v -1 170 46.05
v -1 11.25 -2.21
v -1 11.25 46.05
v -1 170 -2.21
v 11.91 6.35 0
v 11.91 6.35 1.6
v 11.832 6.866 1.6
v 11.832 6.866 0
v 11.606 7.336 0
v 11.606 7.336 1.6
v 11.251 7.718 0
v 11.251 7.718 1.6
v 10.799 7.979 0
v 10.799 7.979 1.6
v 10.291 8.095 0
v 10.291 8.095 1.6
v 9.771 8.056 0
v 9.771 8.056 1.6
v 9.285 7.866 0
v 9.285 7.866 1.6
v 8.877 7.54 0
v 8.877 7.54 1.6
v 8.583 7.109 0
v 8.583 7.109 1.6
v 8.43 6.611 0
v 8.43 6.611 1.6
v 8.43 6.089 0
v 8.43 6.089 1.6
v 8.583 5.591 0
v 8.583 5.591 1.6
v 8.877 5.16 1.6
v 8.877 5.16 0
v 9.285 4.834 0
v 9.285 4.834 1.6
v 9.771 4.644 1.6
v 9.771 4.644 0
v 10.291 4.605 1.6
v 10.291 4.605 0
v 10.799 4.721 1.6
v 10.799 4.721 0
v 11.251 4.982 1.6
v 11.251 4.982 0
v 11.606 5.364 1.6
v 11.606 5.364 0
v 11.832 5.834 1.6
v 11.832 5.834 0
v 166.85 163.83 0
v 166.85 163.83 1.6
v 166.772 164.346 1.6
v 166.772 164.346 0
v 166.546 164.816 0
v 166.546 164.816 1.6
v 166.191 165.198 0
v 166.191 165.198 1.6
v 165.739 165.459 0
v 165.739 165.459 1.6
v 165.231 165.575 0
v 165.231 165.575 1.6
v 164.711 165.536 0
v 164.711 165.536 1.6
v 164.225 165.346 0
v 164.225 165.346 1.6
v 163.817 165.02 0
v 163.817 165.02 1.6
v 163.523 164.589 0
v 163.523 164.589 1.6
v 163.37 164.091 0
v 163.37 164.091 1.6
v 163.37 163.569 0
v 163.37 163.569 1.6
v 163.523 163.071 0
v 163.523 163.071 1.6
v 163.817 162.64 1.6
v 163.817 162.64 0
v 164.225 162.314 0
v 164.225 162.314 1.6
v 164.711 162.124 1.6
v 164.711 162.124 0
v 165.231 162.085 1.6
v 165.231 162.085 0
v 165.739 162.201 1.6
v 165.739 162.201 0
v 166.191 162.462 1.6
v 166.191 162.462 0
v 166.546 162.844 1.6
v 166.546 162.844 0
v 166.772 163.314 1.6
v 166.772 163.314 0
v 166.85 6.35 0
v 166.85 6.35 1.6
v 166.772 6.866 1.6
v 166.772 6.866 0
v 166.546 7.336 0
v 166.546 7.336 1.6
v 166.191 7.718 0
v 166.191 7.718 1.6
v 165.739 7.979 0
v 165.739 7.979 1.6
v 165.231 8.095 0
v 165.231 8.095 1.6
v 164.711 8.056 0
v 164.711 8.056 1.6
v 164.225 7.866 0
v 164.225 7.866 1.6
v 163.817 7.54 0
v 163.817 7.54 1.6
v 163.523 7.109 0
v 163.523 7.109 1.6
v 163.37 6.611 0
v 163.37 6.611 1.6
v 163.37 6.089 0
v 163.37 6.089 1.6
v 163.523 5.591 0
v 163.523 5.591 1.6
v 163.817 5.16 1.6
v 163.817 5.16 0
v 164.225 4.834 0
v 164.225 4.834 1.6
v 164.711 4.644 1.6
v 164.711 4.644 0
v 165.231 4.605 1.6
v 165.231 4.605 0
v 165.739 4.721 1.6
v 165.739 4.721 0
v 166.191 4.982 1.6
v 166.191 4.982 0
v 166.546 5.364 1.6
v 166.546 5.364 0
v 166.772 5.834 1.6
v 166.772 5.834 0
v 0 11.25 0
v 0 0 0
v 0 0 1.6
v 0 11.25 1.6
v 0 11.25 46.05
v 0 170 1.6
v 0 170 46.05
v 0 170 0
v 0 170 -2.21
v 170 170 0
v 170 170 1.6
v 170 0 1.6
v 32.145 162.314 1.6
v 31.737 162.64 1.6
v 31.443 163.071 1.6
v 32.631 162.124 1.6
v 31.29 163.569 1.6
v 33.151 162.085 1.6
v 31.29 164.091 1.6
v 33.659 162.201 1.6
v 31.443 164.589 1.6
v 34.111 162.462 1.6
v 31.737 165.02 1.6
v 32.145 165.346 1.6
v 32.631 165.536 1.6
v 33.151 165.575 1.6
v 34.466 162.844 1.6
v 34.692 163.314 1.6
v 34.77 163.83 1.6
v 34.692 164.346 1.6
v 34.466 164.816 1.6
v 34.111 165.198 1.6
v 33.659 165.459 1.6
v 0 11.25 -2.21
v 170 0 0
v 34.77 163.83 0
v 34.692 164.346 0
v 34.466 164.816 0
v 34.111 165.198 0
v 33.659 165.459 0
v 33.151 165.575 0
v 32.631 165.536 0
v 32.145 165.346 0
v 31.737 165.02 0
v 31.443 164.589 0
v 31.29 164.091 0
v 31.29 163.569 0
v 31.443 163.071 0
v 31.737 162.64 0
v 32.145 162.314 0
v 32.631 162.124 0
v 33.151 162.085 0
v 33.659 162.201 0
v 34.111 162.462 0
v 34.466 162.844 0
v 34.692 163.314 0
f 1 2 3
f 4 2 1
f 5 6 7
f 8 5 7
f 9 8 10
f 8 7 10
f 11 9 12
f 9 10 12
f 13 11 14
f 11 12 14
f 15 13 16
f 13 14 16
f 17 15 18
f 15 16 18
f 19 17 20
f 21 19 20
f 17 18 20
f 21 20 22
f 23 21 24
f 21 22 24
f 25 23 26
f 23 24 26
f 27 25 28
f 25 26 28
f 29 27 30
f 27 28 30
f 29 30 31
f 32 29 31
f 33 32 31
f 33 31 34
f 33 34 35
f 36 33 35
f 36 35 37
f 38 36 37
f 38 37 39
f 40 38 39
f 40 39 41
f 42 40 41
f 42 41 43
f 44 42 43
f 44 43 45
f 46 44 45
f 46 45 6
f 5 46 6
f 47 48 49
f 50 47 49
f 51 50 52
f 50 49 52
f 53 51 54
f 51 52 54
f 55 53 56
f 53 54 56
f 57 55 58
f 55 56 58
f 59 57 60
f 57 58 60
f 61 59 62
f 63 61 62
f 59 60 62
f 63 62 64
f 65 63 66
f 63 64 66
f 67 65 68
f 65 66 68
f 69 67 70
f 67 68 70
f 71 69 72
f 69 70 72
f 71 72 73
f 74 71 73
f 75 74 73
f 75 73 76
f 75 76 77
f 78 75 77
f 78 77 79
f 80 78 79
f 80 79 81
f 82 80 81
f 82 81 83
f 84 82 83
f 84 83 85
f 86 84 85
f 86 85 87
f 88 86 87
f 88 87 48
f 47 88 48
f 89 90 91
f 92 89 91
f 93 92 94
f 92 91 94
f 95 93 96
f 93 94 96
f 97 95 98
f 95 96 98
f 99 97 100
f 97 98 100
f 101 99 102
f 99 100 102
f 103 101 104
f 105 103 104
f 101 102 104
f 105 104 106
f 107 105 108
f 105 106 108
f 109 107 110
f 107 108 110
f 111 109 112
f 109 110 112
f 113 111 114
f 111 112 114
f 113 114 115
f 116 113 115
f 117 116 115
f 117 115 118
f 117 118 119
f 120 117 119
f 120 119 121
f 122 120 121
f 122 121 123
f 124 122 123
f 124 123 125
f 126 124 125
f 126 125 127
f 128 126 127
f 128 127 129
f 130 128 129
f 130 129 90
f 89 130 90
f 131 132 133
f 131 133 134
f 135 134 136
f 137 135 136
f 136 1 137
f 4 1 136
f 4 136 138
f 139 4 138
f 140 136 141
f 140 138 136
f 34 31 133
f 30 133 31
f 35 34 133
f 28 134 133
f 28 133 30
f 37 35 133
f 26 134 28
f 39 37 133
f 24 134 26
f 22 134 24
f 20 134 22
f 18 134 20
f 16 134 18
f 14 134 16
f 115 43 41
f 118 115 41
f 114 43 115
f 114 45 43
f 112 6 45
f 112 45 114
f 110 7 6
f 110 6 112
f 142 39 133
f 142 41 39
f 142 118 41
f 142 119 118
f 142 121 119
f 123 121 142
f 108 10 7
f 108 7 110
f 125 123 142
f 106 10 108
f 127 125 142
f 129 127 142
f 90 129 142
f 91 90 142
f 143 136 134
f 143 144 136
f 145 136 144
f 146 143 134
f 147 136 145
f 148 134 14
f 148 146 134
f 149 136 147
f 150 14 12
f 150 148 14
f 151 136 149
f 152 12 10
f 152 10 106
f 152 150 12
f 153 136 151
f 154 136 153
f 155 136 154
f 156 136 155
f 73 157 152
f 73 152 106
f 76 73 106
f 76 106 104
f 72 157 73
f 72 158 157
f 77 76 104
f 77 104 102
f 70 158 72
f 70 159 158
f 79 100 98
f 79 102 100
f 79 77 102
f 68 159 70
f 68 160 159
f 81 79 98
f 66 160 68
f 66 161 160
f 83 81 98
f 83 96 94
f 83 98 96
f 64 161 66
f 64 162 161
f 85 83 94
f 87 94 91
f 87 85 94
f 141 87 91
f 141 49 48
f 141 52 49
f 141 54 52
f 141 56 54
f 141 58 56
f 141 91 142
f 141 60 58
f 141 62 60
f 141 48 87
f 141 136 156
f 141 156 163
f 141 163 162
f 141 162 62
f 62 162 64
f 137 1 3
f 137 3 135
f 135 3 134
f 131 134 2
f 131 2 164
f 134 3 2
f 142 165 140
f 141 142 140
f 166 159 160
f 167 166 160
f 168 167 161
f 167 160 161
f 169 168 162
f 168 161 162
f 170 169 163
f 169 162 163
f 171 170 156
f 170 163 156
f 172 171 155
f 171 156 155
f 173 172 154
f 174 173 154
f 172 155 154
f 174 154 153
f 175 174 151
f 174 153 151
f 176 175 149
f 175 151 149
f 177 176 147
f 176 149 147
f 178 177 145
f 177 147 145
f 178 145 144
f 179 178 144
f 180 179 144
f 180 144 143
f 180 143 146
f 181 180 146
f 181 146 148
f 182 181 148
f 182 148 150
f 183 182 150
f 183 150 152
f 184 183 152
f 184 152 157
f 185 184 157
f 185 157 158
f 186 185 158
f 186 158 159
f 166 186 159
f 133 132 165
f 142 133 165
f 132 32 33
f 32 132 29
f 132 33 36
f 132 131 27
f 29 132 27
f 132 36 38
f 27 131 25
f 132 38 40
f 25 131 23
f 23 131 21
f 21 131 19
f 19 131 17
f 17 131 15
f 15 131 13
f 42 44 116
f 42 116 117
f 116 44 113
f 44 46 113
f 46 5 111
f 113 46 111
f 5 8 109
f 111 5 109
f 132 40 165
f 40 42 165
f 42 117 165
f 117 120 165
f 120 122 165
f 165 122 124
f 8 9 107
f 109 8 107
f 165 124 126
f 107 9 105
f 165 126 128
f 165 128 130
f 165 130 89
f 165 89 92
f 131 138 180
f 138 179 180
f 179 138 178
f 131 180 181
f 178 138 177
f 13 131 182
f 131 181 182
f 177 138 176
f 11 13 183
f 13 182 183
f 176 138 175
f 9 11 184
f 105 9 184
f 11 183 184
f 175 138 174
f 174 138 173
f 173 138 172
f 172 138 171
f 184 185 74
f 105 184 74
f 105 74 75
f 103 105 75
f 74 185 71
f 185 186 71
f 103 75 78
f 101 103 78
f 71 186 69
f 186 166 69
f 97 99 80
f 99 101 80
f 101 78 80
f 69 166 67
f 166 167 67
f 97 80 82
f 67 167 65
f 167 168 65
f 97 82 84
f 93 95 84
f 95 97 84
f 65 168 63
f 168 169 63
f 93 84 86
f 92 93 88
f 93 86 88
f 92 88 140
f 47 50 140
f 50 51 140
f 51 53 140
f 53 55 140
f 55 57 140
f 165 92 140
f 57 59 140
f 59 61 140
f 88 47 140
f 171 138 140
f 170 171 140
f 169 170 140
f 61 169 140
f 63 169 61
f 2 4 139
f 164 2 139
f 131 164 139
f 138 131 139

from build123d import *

# Parameters (mm, degrees)
SKETCH_1_W           = 170
SKETCH_1_H           = 170
EXTRUDE_1_DEPTH      = 1.6
SKETCH_2_R           = 1.75
CUT_EXTRUDE_2_DEPTH  = 241.421629643
EXTRUDE_2_DEPTH      = 44.45
EXTRUDE_2_DEPTH_BACK = 3.81
SKETCH_5_W           = 1
SKETCH_5_H           = 158.75


with BuildPart() as part:
    # 草图1 → 凸台-拉伸1 (new body)
    with BuildSketch(Plane.XY):
        with Locations((85, 85)):
            Rectangle(SKETCH_1_W, SKETCH_1_H)
    extrude(amount=EXTRUDE_1_DEPTH)

    # 草图2 → 切除-拉伸2 (cut, through all)
    with BuildSketch(Plane.XY.offset(1.6)):
        with Locations((10.16, 6.35)):
            Circle(SKETCH_2_R)
        with Locations((165.1, 6.35)):
            Circle(SKETCH_2_R)
        with Locations((165.1, 163.83)):
            Circle(SKETCH_2_R)
        with Locations((33.02, 163.83)):
            Circle(SKETCH_2_R)
    extrude(amount=-CUT_EXTRUDE_2_DEPTH, mode=Mode.SUBTRACT)

    # 草图5 → 凸台-拉伸2 (add, two sides: drawn at the far end of the back side and taken through both)
    with BuildSketch(Plane.XY.offset(1.6).offset(-EXTRUDE_2_DEPTH_BACK)):
        with Locations((-0.5, 90.625)):
            Rectangle(SKETCH_5_W, SKETCH_5_H)
    extrude(amount=EXTRUDE_2_DEPTH + EXTRUDE_2_DEPTH_BACK)


solid = part.part
